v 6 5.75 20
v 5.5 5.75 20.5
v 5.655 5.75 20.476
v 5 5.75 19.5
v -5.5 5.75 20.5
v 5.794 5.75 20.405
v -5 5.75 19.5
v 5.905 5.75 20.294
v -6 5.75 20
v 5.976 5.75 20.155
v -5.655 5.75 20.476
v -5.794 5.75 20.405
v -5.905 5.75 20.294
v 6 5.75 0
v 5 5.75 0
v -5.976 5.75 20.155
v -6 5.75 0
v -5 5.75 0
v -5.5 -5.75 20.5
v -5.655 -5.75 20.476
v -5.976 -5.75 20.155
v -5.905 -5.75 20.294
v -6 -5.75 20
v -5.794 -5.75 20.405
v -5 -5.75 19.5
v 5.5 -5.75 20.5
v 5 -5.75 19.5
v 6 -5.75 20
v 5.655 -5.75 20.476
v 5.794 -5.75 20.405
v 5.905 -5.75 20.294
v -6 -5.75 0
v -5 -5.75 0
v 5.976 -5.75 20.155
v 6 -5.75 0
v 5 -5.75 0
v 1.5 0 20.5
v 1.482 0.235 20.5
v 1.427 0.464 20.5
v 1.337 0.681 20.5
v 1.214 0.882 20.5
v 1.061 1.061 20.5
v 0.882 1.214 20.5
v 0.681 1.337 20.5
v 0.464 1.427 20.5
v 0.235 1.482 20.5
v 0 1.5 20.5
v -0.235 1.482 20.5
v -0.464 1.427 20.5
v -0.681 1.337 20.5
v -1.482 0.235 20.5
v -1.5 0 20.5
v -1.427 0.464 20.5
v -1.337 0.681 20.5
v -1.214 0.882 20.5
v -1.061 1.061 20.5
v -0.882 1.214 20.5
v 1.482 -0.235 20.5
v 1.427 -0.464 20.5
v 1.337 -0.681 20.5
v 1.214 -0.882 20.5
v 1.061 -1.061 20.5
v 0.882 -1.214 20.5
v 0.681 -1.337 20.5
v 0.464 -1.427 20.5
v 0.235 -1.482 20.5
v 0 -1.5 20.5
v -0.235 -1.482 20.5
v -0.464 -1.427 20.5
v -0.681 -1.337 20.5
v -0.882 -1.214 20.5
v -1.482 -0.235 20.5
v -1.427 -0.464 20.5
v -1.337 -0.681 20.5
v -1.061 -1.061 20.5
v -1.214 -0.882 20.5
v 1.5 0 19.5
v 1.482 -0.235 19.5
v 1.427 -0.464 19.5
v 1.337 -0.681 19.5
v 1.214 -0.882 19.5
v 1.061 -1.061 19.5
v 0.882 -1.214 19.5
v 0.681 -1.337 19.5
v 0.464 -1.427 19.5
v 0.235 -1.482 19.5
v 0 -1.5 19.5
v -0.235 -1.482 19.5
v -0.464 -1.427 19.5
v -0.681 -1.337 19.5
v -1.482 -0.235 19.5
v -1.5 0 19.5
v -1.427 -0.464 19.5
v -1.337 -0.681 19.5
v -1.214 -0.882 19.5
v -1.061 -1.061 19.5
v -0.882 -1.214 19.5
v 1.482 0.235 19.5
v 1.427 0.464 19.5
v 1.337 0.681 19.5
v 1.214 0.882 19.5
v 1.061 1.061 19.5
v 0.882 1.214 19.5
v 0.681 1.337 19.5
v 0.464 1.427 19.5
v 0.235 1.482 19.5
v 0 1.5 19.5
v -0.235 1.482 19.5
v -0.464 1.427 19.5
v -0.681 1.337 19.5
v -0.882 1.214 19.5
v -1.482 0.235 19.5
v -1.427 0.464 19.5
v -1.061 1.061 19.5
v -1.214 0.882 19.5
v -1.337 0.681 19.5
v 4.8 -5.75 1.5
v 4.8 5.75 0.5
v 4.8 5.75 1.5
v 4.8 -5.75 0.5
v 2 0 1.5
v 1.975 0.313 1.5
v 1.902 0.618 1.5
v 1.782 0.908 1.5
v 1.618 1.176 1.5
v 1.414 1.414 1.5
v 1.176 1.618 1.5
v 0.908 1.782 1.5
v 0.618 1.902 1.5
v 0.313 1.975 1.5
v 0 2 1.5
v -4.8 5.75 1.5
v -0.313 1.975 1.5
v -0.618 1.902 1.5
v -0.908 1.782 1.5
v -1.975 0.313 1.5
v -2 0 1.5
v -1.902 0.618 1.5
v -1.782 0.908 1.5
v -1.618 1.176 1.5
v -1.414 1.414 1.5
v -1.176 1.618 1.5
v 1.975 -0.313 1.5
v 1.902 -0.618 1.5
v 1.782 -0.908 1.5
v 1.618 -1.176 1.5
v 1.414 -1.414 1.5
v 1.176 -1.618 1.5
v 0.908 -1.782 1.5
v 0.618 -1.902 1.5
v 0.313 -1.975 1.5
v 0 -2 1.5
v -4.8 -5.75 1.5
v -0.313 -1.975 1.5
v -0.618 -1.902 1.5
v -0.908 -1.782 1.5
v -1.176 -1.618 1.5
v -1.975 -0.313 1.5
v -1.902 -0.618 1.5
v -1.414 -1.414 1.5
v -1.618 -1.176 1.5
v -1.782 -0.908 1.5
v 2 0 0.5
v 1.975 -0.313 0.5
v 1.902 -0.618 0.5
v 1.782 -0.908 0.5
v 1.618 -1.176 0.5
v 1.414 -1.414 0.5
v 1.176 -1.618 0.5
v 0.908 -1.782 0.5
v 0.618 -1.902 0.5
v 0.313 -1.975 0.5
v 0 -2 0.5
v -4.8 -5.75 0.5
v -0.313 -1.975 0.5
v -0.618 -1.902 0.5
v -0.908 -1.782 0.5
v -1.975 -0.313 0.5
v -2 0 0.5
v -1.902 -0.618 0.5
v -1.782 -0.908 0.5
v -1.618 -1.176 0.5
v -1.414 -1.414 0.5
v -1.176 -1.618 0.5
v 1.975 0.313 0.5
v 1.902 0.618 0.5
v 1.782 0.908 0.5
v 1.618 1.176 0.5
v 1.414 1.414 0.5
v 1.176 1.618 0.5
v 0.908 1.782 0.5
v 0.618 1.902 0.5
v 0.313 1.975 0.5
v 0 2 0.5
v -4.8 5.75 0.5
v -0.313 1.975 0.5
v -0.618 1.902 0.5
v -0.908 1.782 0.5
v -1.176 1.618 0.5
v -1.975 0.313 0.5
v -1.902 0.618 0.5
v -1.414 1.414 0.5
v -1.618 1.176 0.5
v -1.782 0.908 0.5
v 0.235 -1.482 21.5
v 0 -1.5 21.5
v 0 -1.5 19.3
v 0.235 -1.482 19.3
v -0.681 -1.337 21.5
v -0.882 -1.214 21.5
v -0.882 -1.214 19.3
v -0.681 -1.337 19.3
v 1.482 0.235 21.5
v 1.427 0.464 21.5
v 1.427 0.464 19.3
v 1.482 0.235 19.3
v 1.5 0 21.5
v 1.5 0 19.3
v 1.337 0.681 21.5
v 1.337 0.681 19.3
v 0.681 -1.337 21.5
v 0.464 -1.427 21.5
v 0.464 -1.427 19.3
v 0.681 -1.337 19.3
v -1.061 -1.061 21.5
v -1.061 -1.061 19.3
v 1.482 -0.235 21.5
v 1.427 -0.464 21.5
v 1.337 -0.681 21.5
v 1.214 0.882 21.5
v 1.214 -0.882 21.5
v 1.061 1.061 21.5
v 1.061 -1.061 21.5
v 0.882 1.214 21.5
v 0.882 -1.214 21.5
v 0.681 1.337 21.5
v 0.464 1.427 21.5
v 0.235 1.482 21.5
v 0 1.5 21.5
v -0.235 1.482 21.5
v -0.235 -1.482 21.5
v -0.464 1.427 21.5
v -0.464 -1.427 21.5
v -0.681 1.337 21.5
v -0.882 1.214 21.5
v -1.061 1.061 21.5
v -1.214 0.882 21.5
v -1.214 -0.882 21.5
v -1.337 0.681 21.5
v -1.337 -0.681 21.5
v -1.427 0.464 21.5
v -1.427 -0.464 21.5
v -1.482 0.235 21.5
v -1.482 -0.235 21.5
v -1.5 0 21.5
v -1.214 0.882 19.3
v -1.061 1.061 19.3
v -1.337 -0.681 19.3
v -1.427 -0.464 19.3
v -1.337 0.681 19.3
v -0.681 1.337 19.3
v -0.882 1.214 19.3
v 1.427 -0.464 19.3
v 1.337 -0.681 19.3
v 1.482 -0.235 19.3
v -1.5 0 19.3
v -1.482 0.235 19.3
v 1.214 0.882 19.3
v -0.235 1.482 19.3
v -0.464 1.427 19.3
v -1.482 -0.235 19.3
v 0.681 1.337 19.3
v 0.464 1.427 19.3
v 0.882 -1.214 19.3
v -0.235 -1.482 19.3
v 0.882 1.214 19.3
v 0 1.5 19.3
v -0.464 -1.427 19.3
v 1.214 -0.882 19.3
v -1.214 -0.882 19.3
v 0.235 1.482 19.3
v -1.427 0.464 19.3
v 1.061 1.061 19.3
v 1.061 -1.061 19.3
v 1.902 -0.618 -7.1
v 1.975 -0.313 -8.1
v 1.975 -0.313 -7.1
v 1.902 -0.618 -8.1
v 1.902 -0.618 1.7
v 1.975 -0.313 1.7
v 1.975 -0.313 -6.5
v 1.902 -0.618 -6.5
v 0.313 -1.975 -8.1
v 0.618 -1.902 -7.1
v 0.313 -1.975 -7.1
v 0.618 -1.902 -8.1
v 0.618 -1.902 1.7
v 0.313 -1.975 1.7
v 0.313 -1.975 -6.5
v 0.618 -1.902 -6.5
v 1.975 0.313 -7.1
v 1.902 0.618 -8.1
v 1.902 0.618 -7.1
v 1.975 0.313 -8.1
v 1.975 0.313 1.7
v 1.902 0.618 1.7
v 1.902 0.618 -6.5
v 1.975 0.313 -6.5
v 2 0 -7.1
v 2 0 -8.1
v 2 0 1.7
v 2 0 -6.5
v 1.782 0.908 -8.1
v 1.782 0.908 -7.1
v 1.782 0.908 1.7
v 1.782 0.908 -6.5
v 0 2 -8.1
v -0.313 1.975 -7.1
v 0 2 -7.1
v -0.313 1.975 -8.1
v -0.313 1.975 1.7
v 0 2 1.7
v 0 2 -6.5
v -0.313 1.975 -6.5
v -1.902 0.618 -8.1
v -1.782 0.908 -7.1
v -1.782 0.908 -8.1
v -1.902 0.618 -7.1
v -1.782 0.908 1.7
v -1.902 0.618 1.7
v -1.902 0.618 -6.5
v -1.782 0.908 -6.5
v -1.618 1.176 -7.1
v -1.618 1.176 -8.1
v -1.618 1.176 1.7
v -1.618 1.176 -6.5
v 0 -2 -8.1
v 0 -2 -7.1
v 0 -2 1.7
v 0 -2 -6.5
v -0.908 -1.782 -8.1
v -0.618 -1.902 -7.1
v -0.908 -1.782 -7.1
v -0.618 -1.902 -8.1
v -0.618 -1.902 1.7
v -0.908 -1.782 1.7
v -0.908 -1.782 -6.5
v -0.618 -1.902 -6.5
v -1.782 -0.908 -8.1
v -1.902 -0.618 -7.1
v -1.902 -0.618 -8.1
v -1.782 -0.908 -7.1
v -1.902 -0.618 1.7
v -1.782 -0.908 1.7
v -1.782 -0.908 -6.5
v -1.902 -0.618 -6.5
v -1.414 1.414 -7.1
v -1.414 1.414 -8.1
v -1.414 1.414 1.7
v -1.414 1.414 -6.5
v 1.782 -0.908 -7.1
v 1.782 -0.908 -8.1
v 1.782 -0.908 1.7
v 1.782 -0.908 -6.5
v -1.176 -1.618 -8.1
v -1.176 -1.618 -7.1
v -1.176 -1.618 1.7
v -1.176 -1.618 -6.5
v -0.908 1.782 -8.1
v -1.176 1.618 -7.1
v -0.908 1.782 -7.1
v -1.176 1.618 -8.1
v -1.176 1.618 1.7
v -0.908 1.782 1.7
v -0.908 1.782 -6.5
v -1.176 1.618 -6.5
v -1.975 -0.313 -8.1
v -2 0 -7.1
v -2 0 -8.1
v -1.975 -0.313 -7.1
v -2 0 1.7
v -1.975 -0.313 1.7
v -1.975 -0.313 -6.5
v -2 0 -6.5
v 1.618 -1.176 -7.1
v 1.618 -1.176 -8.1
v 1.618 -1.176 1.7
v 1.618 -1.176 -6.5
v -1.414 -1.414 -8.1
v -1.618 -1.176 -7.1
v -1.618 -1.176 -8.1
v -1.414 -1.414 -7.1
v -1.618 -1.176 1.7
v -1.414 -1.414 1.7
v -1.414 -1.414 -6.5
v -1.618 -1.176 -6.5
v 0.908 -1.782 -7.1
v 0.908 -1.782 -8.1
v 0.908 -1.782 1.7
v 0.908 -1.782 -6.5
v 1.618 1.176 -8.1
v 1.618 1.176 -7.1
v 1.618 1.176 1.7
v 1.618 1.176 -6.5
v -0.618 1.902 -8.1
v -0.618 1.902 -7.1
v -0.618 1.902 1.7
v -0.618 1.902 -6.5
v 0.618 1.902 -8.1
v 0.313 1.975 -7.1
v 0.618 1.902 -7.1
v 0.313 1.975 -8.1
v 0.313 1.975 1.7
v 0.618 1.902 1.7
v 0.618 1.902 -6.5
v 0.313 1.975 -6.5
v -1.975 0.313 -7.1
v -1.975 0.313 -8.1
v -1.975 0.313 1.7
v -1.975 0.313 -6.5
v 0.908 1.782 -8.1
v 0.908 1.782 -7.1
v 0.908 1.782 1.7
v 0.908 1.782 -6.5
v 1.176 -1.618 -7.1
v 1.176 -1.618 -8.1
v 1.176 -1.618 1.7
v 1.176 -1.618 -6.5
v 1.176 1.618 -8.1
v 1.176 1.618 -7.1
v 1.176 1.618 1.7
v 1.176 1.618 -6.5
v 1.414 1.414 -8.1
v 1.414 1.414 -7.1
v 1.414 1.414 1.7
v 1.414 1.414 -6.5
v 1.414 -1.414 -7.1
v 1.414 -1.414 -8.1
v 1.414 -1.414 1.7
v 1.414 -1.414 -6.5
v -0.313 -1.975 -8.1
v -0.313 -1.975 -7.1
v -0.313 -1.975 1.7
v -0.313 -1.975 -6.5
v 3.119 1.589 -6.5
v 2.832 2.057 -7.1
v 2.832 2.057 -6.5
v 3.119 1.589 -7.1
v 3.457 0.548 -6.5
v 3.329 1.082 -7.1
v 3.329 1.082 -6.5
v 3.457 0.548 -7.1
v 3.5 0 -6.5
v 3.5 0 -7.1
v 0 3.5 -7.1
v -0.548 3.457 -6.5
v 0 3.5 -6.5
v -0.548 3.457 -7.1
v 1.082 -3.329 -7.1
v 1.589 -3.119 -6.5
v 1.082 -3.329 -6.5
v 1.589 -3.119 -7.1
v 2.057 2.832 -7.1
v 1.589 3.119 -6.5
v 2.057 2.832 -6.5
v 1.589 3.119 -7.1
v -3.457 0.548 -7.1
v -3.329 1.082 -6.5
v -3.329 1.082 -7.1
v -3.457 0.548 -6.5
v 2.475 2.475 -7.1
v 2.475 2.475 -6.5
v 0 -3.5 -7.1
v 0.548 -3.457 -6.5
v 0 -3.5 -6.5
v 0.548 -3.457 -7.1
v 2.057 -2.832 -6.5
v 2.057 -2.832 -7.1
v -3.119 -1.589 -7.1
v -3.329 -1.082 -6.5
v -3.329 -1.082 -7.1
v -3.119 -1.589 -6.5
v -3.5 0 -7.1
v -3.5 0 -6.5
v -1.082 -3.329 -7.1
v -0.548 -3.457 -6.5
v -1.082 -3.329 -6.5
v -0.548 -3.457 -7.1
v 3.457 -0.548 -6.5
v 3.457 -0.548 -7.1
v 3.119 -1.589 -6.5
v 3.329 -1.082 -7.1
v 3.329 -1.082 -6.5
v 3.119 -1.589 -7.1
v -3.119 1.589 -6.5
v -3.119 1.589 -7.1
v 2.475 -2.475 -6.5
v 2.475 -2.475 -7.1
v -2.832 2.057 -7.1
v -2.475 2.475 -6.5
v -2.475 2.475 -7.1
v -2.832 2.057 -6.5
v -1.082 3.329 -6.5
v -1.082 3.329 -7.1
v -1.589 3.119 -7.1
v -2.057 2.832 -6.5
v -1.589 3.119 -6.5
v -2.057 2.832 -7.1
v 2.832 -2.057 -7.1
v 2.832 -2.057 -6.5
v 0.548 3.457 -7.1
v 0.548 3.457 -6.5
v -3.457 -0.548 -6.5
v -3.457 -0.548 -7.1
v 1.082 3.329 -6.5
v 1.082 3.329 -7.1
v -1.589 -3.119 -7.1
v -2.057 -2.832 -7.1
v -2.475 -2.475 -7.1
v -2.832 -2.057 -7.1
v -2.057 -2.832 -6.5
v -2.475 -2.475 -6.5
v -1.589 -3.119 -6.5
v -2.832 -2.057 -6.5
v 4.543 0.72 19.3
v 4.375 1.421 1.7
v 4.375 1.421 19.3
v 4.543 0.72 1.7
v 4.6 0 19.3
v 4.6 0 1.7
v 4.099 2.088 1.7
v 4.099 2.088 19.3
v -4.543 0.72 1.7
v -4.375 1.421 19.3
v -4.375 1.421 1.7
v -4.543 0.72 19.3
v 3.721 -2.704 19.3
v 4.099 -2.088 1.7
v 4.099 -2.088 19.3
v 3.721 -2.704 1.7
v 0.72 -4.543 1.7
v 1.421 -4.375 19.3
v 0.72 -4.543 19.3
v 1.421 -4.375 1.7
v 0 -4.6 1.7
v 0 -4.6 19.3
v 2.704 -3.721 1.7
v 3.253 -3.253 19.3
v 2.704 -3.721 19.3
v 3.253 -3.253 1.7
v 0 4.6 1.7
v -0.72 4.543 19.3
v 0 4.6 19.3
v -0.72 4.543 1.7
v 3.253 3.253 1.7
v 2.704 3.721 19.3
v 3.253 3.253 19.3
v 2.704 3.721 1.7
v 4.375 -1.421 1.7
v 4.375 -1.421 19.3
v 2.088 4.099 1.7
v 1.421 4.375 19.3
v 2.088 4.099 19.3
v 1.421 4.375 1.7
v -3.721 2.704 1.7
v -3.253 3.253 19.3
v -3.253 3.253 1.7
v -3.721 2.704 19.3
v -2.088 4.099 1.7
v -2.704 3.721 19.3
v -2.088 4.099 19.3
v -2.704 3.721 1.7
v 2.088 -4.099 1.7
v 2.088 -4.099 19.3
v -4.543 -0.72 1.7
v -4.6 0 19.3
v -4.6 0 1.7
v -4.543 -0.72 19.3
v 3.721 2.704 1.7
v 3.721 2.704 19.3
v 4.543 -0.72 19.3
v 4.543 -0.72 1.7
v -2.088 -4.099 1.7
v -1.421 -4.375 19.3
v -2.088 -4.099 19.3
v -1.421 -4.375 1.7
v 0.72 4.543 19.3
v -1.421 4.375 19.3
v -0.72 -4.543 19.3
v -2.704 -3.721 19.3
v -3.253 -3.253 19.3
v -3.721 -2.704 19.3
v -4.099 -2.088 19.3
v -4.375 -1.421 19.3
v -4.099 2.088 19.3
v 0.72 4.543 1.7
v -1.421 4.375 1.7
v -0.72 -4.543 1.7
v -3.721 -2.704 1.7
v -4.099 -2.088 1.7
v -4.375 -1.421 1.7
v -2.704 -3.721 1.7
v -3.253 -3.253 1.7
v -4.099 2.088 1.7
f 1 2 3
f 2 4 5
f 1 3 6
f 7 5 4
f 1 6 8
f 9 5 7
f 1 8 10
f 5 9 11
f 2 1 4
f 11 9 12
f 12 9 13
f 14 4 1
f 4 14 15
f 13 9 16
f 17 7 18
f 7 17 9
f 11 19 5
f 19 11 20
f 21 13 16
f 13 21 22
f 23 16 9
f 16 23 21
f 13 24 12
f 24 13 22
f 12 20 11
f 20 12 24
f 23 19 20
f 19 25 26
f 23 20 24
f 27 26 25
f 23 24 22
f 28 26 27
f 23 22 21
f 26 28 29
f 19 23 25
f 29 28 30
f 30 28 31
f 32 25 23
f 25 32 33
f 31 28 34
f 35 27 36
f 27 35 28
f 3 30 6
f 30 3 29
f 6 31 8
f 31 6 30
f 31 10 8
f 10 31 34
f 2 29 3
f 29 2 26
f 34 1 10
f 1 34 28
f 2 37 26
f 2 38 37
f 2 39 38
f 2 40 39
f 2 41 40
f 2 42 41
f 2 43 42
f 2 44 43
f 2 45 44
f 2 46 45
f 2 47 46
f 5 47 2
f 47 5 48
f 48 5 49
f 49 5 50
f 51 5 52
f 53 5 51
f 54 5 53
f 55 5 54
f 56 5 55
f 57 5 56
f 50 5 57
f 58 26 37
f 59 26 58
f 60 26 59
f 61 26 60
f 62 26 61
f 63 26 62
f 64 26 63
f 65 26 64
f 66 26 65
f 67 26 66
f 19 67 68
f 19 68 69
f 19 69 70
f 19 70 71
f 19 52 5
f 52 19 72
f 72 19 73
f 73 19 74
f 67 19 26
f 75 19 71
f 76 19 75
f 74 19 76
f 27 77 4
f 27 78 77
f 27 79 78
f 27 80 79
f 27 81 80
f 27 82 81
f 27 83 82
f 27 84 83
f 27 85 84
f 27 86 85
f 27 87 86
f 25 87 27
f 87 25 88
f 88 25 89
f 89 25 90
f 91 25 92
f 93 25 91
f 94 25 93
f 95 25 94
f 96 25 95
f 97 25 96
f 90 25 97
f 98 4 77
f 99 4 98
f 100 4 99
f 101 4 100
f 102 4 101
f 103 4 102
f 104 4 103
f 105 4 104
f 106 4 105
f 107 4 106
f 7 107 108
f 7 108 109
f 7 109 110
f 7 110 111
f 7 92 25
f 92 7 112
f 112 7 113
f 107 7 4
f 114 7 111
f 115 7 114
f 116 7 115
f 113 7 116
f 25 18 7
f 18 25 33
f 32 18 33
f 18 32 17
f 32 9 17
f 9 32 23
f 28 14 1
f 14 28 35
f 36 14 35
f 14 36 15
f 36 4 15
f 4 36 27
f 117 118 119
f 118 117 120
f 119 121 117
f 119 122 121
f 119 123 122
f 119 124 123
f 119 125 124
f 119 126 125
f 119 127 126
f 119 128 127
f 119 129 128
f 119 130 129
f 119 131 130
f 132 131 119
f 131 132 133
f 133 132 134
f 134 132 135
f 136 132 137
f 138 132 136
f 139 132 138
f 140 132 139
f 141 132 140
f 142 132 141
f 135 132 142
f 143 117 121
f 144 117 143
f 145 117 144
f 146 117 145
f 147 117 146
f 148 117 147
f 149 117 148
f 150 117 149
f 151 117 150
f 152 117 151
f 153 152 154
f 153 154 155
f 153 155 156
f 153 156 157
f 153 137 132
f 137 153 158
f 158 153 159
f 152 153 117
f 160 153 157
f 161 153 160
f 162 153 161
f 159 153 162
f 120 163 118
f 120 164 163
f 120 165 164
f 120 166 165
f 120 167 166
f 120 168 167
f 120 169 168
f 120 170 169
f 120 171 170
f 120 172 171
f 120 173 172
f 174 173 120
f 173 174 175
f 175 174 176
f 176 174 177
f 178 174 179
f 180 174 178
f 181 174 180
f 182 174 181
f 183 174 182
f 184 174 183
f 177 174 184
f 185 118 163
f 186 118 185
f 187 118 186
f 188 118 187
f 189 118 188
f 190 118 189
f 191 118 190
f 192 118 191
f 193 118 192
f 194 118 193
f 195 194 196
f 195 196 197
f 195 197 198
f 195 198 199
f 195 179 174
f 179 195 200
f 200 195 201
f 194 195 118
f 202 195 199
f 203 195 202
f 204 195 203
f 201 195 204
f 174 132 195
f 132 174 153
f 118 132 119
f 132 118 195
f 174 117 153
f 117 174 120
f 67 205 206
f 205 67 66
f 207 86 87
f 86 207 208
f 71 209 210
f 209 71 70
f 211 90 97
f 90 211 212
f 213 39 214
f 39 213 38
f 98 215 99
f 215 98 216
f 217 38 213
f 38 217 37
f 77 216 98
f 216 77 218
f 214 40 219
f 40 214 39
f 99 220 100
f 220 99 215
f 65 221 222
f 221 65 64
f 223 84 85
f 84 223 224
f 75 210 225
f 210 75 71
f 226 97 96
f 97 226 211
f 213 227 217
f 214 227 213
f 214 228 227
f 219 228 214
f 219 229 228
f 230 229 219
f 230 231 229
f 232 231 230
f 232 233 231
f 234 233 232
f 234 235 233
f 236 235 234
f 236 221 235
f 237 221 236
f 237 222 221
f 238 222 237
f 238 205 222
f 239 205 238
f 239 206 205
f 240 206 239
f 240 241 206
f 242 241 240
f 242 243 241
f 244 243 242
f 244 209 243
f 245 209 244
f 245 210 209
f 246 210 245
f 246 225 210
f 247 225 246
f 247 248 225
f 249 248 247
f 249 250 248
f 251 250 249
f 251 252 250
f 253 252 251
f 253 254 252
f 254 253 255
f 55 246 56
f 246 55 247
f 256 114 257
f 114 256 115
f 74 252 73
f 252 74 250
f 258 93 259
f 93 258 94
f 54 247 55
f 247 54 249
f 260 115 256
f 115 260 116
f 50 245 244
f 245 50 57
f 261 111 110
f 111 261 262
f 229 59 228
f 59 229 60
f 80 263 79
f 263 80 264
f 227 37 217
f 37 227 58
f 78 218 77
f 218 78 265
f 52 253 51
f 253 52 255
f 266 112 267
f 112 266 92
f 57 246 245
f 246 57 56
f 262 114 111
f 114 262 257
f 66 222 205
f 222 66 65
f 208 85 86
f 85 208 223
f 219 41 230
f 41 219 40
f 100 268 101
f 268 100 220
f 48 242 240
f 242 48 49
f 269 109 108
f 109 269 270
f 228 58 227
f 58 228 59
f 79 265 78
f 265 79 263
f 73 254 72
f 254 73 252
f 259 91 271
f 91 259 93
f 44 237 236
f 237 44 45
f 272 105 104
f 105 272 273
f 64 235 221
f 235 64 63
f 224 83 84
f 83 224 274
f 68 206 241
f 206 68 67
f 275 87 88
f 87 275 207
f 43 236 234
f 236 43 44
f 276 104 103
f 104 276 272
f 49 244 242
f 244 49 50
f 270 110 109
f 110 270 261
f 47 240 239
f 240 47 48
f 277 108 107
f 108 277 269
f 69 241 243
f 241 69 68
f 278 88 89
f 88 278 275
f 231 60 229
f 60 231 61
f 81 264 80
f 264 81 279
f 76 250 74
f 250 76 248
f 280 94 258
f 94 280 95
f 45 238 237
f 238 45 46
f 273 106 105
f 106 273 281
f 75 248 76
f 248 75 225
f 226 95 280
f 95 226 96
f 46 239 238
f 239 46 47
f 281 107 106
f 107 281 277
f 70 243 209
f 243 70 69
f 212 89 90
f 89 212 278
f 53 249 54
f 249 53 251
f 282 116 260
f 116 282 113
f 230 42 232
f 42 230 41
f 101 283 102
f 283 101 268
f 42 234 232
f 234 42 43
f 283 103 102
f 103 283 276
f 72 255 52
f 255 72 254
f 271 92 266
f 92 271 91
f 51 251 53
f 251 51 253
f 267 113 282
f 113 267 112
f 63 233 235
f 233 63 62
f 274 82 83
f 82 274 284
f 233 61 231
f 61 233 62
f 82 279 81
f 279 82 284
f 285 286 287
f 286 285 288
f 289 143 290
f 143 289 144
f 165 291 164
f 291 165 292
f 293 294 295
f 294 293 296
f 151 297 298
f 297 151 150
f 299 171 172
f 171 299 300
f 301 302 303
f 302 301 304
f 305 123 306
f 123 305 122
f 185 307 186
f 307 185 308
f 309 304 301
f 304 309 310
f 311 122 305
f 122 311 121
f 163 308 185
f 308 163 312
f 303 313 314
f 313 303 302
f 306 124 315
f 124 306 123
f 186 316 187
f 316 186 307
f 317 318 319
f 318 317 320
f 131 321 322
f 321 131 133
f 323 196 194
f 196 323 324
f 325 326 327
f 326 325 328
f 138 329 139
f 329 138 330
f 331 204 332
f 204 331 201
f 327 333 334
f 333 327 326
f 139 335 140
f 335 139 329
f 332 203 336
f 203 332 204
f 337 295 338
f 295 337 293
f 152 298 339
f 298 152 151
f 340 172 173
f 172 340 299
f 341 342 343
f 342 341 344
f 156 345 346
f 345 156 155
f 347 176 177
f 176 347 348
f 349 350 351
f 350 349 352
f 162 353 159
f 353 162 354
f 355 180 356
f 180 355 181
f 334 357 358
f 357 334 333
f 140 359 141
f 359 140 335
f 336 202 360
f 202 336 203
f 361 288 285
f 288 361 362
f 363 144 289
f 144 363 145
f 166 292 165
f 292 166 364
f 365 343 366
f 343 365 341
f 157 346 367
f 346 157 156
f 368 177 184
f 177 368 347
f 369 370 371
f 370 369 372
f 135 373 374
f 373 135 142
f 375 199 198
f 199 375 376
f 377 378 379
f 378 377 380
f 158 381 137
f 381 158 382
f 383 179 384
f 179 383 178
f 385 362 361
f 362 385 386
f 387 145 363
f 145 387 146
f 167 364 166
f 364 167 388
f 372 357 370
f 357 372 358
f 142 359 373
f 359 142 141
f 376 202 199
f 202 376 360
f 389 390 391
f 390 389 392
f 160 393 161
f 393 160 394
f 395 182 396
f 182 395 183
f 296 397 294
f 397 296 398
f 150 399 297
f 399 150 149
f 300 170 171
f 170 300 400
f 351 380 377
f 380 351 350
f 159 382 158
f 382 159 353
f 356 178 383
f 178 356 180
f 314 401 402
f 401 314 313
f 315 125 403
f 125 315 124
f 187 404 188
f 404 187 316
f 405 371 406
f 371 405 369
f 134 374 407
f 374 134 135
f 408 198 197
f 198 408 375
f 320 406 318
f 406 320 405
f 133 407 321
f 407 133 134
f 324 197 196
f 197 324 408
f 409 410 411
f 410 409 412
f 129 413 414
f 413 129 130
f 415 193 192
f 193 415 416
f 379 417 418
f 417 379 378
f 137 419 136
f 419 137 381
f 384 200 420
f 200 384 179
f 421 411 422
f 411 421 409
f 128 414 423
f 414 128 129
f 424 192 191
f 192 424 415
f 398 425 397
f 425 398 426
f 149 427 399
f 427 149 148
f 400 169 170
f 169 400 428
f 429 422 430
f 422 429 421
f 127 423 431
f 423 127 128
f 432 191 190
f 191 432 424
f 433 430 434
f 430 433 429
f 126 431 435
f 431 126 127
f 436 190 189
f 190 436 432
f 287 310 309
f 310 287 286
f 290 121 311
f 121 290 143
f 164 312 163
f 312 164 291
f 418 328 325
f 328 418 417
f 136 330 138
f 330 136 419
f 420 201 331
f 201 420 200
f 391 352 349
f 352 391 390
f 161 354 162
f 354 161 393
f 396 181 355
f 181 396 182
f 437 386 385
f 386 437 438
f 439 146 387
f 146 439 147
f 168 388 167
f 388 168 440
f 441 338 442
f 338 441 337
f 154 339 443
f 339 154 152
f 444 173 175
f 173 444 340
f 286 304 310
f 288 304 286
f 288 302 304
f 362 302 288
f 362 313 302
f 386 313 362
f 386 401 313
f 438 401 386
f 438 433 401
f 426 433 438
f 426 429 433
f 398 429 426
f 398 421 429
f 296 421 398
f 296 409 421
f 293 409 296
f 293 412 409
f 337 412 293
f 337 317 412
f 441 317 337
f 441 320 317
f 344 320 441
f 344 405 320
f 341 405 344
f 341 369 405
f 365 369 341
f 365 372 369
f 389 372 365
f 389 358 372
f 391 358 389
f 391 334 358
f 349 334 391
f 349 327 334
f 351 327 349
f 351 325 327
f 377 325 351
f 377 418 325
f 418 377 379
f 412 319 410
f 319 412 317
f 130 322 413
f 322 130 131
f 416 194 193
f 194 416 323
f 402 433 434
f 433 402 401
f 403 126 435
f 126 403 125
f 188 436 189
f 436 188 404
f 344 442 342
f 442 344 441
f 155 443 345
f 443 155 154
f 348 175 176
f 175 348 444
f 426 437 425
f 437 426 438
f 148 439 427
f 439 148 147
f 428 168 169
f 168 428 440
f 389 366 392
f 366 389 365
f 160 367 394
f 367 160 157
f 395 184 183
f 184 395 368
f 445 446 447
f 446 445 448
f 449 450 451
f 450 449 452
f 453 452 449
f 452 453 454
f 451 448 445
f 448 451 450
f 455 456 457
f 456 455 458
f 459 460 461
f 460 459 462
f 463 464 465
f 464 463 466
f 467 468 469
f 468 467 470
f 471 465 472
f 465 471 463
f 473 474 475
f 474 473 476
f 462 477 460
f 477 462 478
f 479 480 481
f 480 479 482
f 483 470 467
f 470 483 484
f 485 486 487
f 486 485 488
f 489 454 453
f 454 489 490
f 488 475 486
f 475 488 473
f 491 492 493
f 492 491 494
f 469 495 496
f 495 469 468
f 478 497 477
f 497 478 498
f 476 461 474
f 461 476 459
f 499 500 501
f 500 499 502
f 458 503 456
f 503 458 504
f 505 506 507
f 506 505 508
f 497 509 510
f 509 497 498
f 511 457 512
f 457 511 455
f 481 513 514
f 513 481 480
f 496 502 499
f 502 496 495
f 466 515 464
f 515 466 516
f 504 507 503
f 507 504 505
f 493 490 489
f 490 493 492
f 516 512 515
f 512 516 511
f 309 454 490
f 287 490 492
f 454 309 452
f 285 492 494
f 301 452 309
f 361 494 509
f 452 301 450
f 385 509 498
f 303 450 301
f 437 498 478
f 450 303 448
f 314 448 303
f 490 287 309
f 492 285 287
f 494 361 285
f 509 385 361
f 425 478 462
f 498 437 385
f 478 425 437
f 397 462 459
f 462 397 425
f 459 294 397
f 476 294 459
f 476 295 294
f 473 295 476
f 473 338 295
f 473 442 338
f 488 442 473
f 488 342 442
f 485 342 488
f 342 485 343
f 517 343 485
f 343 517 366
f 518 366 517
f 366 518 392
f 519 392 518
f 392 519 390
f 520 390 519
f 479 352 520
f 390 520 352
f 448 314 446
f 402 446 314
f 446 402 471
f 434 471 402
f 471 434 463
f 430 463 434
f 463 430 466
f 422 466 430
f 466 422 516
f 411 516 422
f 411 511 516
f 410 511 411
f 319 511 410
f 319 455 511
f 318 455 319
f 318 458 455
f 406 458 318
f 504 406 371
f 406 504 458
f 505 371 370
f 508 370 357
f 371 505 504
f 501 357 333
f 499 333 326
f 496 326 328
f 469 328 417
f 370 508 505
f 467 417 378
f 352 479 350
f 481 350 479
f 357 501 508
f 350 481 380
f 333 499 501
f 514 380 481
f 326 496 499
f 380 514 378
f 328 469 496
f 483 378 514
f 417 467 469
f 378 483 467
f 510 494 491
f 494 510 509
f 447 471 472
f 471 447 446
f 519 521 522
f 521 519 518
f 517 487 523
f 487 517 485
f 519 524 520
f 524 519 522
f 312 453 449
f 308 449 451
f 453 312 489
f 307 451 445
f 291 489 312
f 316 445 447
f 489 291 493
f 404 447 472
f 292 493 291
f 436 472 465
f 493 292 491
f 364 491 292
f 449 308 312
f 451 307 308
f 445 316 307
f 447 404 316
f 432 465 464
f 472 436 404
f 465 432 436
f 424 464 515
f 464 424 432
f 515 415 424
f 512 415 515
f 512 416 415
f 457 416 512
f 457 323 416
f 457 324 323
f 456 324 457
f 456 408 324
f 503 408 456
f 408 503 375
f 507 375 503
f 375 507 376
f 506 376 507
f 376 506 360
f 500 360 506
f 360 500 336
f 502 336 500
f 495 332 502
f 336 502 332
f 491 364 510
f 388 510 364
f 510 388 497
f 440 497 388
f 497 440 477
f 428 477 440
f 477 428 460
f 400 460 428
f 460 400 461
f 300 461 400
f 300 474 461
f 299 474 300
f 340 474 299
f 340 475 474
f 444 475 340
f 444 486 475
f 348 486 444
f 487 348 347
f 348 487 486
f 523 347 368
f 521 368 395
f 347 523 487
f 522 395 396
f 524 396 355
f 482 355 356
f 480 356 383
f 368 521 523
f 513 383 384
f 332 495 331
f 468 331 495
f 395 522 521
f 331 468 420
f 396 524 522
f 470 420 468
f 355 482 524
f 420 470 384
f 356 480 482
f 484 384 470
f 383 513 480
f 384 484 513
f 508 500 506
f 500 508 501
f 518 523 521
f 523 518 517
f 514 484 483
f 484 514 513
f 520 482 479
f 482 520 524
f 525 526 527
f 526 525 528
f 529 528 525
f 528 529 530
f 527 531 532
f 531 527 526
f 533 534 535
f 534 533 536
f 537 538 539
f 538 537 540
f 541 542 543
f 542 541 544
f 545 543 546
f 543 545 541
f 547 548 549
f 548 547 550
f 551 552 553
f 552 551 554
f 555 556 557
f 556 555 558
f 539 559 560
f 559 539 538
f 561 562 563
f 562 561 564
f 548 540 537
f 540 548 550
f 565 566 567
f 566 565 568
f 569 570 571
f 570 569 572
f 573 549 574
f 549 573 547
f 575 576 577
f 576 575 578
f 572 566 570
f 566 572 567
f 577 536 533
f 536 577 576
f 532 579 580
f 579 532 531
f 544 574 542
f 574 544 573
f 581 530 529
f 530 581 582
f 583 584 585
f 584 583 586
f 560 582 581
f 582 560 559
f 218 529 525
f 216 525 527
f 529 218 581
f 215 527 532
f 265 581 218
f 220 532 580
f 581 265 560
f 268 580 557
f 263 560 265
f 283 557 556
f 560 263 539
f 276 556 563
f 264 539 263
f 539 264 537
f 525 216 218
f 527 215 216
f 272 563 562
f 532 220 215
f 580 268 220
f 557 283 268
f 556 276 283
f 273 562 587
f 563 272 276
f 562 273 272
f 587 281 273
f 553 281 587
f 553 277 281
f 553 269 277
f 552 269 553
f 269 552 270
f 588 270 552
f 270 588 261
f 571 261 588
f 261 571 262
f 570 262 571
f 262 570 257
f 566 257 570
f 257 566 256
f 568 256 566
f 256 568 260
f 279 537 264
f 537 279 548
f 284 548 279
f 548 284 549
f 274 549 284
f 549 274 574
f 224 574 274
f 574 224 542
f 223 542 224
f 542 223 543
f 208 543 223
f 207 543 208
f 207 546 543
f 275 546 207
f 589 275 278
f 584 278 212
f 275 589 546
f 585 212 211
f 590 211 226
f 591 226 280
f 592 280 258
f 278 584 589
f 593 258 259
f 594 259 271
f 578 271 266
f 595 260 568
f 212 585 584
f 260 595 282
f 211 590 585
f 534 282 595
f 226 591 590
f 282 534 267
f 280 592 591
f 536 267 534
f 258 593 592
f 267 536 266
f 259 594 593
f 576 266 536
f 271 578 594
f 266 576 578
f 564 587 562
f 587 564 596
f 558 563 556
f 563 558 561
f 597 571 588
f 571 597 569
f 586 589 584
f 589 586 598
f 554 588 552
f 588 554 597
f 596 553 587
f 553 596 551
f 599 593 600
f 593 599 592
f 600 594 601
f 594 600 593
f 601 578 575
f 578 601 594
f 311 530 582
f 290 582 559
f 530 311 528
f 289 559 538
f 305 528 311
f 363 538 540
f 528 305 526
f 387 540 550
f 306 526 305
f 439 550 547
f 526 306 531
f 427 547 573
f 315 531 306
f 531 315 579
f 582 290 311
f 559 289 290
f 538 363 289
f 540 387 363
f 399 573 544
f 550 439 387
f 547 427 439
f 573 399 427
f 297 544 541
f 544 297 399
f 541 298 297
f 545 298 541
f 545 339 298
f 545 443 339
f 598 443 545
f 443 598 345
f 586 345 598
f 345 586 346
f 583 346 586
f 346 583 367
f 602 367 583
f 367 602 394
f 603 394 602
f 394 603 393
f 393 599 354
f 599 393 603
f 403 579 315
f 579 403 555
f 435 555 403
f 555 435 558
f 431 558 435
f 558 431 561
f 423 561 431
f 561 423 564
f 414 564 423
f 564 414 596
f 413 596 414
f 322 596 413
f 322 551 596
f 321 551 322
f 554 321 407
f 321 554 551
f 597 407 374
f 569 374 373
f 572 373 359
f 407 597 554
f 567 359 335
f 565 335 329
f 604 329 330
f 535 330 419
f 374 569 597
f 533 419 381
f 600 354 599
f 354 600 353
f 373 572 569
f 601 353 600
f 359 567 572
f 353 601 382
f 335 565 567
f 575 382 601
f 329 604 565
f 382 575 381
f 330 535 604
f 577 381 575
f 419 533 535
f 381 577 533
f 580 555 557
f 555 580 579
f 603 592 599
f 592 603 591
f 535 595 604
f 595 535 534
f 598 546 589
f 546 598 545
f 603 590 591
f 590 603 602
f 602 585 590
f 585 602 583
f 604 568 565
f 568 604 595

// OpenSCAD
X=0;Y=1;Z=2;

// Draw a solenoid of {size}
// {off} is the extension when not energised
// {on} is the extension when engergised
// {power} is the current power, between 0 and 1.
module Solenoid(size, off, on, power)
{
	thick = 1;
	rad = 0.5;
	gap = 0.2;

	position = -off+power*(off-on);

	translate(-[size[X]/2, size[Y]/2, 0])
	union()
	{
		color("lightgrey")
		union()
		{
			// Top left roundness
			translate([rad, 0, size[Z]-rad])
			rotate([-90, 0, 0])
			cylinder(h=size[Y], r=rad, $fn=20);

			// Top right roundness
			translate([size[X]-rad, 0, size[Z]-rad])
			rotate([-90, 0, 0])
			cylinder(h=size[Y], r=rad, $fn=20);

			// Top
			translate([rad, 0, size[Z]-thick])
			cube([size[X]-thick, size[Y], thick]);
	
			// Left
			cube([thick, size[Y], size[Z]-rad]);

			// Right
			translate([size[X]-thick, 0, 0])
			cube([thick, size[Y], size[Z]-rad]);

			// Bottom
			translate([thick+gap, 0, rad])
			cube([size[X]-thick*2-gap*2, size[Y], thick]);

			// Actuator (top)
			translate([size[X]/2, size[Y]/2, 0])
			cylinder(r=1.5, h=size[Z]+1, $fn=40);

			// Actuator (bottom)
			translate([size[X]/2, size[Y]/2, position])
			cylinder(r=2, h=size[Z], $fn=40);
		}

		// Spring clip
		color("black")
		translate([size[X]/2, size[Y]/2, position+1])
		cylinder(r=3.5, h=0.6, $fn=40);

		// Coil
		color("blue")
		translate([size[X]/2, size[Y]/2, rad+thick+gap])
		cylinder(h=size[Z]-rad-thick*2-gap*2, r=(size[X]-thick*2-gap*2)/2-gap, $fn=40);
	}
}

Solenoid([12, 11.5, 20.5], 8.1, 4.2, 0);
